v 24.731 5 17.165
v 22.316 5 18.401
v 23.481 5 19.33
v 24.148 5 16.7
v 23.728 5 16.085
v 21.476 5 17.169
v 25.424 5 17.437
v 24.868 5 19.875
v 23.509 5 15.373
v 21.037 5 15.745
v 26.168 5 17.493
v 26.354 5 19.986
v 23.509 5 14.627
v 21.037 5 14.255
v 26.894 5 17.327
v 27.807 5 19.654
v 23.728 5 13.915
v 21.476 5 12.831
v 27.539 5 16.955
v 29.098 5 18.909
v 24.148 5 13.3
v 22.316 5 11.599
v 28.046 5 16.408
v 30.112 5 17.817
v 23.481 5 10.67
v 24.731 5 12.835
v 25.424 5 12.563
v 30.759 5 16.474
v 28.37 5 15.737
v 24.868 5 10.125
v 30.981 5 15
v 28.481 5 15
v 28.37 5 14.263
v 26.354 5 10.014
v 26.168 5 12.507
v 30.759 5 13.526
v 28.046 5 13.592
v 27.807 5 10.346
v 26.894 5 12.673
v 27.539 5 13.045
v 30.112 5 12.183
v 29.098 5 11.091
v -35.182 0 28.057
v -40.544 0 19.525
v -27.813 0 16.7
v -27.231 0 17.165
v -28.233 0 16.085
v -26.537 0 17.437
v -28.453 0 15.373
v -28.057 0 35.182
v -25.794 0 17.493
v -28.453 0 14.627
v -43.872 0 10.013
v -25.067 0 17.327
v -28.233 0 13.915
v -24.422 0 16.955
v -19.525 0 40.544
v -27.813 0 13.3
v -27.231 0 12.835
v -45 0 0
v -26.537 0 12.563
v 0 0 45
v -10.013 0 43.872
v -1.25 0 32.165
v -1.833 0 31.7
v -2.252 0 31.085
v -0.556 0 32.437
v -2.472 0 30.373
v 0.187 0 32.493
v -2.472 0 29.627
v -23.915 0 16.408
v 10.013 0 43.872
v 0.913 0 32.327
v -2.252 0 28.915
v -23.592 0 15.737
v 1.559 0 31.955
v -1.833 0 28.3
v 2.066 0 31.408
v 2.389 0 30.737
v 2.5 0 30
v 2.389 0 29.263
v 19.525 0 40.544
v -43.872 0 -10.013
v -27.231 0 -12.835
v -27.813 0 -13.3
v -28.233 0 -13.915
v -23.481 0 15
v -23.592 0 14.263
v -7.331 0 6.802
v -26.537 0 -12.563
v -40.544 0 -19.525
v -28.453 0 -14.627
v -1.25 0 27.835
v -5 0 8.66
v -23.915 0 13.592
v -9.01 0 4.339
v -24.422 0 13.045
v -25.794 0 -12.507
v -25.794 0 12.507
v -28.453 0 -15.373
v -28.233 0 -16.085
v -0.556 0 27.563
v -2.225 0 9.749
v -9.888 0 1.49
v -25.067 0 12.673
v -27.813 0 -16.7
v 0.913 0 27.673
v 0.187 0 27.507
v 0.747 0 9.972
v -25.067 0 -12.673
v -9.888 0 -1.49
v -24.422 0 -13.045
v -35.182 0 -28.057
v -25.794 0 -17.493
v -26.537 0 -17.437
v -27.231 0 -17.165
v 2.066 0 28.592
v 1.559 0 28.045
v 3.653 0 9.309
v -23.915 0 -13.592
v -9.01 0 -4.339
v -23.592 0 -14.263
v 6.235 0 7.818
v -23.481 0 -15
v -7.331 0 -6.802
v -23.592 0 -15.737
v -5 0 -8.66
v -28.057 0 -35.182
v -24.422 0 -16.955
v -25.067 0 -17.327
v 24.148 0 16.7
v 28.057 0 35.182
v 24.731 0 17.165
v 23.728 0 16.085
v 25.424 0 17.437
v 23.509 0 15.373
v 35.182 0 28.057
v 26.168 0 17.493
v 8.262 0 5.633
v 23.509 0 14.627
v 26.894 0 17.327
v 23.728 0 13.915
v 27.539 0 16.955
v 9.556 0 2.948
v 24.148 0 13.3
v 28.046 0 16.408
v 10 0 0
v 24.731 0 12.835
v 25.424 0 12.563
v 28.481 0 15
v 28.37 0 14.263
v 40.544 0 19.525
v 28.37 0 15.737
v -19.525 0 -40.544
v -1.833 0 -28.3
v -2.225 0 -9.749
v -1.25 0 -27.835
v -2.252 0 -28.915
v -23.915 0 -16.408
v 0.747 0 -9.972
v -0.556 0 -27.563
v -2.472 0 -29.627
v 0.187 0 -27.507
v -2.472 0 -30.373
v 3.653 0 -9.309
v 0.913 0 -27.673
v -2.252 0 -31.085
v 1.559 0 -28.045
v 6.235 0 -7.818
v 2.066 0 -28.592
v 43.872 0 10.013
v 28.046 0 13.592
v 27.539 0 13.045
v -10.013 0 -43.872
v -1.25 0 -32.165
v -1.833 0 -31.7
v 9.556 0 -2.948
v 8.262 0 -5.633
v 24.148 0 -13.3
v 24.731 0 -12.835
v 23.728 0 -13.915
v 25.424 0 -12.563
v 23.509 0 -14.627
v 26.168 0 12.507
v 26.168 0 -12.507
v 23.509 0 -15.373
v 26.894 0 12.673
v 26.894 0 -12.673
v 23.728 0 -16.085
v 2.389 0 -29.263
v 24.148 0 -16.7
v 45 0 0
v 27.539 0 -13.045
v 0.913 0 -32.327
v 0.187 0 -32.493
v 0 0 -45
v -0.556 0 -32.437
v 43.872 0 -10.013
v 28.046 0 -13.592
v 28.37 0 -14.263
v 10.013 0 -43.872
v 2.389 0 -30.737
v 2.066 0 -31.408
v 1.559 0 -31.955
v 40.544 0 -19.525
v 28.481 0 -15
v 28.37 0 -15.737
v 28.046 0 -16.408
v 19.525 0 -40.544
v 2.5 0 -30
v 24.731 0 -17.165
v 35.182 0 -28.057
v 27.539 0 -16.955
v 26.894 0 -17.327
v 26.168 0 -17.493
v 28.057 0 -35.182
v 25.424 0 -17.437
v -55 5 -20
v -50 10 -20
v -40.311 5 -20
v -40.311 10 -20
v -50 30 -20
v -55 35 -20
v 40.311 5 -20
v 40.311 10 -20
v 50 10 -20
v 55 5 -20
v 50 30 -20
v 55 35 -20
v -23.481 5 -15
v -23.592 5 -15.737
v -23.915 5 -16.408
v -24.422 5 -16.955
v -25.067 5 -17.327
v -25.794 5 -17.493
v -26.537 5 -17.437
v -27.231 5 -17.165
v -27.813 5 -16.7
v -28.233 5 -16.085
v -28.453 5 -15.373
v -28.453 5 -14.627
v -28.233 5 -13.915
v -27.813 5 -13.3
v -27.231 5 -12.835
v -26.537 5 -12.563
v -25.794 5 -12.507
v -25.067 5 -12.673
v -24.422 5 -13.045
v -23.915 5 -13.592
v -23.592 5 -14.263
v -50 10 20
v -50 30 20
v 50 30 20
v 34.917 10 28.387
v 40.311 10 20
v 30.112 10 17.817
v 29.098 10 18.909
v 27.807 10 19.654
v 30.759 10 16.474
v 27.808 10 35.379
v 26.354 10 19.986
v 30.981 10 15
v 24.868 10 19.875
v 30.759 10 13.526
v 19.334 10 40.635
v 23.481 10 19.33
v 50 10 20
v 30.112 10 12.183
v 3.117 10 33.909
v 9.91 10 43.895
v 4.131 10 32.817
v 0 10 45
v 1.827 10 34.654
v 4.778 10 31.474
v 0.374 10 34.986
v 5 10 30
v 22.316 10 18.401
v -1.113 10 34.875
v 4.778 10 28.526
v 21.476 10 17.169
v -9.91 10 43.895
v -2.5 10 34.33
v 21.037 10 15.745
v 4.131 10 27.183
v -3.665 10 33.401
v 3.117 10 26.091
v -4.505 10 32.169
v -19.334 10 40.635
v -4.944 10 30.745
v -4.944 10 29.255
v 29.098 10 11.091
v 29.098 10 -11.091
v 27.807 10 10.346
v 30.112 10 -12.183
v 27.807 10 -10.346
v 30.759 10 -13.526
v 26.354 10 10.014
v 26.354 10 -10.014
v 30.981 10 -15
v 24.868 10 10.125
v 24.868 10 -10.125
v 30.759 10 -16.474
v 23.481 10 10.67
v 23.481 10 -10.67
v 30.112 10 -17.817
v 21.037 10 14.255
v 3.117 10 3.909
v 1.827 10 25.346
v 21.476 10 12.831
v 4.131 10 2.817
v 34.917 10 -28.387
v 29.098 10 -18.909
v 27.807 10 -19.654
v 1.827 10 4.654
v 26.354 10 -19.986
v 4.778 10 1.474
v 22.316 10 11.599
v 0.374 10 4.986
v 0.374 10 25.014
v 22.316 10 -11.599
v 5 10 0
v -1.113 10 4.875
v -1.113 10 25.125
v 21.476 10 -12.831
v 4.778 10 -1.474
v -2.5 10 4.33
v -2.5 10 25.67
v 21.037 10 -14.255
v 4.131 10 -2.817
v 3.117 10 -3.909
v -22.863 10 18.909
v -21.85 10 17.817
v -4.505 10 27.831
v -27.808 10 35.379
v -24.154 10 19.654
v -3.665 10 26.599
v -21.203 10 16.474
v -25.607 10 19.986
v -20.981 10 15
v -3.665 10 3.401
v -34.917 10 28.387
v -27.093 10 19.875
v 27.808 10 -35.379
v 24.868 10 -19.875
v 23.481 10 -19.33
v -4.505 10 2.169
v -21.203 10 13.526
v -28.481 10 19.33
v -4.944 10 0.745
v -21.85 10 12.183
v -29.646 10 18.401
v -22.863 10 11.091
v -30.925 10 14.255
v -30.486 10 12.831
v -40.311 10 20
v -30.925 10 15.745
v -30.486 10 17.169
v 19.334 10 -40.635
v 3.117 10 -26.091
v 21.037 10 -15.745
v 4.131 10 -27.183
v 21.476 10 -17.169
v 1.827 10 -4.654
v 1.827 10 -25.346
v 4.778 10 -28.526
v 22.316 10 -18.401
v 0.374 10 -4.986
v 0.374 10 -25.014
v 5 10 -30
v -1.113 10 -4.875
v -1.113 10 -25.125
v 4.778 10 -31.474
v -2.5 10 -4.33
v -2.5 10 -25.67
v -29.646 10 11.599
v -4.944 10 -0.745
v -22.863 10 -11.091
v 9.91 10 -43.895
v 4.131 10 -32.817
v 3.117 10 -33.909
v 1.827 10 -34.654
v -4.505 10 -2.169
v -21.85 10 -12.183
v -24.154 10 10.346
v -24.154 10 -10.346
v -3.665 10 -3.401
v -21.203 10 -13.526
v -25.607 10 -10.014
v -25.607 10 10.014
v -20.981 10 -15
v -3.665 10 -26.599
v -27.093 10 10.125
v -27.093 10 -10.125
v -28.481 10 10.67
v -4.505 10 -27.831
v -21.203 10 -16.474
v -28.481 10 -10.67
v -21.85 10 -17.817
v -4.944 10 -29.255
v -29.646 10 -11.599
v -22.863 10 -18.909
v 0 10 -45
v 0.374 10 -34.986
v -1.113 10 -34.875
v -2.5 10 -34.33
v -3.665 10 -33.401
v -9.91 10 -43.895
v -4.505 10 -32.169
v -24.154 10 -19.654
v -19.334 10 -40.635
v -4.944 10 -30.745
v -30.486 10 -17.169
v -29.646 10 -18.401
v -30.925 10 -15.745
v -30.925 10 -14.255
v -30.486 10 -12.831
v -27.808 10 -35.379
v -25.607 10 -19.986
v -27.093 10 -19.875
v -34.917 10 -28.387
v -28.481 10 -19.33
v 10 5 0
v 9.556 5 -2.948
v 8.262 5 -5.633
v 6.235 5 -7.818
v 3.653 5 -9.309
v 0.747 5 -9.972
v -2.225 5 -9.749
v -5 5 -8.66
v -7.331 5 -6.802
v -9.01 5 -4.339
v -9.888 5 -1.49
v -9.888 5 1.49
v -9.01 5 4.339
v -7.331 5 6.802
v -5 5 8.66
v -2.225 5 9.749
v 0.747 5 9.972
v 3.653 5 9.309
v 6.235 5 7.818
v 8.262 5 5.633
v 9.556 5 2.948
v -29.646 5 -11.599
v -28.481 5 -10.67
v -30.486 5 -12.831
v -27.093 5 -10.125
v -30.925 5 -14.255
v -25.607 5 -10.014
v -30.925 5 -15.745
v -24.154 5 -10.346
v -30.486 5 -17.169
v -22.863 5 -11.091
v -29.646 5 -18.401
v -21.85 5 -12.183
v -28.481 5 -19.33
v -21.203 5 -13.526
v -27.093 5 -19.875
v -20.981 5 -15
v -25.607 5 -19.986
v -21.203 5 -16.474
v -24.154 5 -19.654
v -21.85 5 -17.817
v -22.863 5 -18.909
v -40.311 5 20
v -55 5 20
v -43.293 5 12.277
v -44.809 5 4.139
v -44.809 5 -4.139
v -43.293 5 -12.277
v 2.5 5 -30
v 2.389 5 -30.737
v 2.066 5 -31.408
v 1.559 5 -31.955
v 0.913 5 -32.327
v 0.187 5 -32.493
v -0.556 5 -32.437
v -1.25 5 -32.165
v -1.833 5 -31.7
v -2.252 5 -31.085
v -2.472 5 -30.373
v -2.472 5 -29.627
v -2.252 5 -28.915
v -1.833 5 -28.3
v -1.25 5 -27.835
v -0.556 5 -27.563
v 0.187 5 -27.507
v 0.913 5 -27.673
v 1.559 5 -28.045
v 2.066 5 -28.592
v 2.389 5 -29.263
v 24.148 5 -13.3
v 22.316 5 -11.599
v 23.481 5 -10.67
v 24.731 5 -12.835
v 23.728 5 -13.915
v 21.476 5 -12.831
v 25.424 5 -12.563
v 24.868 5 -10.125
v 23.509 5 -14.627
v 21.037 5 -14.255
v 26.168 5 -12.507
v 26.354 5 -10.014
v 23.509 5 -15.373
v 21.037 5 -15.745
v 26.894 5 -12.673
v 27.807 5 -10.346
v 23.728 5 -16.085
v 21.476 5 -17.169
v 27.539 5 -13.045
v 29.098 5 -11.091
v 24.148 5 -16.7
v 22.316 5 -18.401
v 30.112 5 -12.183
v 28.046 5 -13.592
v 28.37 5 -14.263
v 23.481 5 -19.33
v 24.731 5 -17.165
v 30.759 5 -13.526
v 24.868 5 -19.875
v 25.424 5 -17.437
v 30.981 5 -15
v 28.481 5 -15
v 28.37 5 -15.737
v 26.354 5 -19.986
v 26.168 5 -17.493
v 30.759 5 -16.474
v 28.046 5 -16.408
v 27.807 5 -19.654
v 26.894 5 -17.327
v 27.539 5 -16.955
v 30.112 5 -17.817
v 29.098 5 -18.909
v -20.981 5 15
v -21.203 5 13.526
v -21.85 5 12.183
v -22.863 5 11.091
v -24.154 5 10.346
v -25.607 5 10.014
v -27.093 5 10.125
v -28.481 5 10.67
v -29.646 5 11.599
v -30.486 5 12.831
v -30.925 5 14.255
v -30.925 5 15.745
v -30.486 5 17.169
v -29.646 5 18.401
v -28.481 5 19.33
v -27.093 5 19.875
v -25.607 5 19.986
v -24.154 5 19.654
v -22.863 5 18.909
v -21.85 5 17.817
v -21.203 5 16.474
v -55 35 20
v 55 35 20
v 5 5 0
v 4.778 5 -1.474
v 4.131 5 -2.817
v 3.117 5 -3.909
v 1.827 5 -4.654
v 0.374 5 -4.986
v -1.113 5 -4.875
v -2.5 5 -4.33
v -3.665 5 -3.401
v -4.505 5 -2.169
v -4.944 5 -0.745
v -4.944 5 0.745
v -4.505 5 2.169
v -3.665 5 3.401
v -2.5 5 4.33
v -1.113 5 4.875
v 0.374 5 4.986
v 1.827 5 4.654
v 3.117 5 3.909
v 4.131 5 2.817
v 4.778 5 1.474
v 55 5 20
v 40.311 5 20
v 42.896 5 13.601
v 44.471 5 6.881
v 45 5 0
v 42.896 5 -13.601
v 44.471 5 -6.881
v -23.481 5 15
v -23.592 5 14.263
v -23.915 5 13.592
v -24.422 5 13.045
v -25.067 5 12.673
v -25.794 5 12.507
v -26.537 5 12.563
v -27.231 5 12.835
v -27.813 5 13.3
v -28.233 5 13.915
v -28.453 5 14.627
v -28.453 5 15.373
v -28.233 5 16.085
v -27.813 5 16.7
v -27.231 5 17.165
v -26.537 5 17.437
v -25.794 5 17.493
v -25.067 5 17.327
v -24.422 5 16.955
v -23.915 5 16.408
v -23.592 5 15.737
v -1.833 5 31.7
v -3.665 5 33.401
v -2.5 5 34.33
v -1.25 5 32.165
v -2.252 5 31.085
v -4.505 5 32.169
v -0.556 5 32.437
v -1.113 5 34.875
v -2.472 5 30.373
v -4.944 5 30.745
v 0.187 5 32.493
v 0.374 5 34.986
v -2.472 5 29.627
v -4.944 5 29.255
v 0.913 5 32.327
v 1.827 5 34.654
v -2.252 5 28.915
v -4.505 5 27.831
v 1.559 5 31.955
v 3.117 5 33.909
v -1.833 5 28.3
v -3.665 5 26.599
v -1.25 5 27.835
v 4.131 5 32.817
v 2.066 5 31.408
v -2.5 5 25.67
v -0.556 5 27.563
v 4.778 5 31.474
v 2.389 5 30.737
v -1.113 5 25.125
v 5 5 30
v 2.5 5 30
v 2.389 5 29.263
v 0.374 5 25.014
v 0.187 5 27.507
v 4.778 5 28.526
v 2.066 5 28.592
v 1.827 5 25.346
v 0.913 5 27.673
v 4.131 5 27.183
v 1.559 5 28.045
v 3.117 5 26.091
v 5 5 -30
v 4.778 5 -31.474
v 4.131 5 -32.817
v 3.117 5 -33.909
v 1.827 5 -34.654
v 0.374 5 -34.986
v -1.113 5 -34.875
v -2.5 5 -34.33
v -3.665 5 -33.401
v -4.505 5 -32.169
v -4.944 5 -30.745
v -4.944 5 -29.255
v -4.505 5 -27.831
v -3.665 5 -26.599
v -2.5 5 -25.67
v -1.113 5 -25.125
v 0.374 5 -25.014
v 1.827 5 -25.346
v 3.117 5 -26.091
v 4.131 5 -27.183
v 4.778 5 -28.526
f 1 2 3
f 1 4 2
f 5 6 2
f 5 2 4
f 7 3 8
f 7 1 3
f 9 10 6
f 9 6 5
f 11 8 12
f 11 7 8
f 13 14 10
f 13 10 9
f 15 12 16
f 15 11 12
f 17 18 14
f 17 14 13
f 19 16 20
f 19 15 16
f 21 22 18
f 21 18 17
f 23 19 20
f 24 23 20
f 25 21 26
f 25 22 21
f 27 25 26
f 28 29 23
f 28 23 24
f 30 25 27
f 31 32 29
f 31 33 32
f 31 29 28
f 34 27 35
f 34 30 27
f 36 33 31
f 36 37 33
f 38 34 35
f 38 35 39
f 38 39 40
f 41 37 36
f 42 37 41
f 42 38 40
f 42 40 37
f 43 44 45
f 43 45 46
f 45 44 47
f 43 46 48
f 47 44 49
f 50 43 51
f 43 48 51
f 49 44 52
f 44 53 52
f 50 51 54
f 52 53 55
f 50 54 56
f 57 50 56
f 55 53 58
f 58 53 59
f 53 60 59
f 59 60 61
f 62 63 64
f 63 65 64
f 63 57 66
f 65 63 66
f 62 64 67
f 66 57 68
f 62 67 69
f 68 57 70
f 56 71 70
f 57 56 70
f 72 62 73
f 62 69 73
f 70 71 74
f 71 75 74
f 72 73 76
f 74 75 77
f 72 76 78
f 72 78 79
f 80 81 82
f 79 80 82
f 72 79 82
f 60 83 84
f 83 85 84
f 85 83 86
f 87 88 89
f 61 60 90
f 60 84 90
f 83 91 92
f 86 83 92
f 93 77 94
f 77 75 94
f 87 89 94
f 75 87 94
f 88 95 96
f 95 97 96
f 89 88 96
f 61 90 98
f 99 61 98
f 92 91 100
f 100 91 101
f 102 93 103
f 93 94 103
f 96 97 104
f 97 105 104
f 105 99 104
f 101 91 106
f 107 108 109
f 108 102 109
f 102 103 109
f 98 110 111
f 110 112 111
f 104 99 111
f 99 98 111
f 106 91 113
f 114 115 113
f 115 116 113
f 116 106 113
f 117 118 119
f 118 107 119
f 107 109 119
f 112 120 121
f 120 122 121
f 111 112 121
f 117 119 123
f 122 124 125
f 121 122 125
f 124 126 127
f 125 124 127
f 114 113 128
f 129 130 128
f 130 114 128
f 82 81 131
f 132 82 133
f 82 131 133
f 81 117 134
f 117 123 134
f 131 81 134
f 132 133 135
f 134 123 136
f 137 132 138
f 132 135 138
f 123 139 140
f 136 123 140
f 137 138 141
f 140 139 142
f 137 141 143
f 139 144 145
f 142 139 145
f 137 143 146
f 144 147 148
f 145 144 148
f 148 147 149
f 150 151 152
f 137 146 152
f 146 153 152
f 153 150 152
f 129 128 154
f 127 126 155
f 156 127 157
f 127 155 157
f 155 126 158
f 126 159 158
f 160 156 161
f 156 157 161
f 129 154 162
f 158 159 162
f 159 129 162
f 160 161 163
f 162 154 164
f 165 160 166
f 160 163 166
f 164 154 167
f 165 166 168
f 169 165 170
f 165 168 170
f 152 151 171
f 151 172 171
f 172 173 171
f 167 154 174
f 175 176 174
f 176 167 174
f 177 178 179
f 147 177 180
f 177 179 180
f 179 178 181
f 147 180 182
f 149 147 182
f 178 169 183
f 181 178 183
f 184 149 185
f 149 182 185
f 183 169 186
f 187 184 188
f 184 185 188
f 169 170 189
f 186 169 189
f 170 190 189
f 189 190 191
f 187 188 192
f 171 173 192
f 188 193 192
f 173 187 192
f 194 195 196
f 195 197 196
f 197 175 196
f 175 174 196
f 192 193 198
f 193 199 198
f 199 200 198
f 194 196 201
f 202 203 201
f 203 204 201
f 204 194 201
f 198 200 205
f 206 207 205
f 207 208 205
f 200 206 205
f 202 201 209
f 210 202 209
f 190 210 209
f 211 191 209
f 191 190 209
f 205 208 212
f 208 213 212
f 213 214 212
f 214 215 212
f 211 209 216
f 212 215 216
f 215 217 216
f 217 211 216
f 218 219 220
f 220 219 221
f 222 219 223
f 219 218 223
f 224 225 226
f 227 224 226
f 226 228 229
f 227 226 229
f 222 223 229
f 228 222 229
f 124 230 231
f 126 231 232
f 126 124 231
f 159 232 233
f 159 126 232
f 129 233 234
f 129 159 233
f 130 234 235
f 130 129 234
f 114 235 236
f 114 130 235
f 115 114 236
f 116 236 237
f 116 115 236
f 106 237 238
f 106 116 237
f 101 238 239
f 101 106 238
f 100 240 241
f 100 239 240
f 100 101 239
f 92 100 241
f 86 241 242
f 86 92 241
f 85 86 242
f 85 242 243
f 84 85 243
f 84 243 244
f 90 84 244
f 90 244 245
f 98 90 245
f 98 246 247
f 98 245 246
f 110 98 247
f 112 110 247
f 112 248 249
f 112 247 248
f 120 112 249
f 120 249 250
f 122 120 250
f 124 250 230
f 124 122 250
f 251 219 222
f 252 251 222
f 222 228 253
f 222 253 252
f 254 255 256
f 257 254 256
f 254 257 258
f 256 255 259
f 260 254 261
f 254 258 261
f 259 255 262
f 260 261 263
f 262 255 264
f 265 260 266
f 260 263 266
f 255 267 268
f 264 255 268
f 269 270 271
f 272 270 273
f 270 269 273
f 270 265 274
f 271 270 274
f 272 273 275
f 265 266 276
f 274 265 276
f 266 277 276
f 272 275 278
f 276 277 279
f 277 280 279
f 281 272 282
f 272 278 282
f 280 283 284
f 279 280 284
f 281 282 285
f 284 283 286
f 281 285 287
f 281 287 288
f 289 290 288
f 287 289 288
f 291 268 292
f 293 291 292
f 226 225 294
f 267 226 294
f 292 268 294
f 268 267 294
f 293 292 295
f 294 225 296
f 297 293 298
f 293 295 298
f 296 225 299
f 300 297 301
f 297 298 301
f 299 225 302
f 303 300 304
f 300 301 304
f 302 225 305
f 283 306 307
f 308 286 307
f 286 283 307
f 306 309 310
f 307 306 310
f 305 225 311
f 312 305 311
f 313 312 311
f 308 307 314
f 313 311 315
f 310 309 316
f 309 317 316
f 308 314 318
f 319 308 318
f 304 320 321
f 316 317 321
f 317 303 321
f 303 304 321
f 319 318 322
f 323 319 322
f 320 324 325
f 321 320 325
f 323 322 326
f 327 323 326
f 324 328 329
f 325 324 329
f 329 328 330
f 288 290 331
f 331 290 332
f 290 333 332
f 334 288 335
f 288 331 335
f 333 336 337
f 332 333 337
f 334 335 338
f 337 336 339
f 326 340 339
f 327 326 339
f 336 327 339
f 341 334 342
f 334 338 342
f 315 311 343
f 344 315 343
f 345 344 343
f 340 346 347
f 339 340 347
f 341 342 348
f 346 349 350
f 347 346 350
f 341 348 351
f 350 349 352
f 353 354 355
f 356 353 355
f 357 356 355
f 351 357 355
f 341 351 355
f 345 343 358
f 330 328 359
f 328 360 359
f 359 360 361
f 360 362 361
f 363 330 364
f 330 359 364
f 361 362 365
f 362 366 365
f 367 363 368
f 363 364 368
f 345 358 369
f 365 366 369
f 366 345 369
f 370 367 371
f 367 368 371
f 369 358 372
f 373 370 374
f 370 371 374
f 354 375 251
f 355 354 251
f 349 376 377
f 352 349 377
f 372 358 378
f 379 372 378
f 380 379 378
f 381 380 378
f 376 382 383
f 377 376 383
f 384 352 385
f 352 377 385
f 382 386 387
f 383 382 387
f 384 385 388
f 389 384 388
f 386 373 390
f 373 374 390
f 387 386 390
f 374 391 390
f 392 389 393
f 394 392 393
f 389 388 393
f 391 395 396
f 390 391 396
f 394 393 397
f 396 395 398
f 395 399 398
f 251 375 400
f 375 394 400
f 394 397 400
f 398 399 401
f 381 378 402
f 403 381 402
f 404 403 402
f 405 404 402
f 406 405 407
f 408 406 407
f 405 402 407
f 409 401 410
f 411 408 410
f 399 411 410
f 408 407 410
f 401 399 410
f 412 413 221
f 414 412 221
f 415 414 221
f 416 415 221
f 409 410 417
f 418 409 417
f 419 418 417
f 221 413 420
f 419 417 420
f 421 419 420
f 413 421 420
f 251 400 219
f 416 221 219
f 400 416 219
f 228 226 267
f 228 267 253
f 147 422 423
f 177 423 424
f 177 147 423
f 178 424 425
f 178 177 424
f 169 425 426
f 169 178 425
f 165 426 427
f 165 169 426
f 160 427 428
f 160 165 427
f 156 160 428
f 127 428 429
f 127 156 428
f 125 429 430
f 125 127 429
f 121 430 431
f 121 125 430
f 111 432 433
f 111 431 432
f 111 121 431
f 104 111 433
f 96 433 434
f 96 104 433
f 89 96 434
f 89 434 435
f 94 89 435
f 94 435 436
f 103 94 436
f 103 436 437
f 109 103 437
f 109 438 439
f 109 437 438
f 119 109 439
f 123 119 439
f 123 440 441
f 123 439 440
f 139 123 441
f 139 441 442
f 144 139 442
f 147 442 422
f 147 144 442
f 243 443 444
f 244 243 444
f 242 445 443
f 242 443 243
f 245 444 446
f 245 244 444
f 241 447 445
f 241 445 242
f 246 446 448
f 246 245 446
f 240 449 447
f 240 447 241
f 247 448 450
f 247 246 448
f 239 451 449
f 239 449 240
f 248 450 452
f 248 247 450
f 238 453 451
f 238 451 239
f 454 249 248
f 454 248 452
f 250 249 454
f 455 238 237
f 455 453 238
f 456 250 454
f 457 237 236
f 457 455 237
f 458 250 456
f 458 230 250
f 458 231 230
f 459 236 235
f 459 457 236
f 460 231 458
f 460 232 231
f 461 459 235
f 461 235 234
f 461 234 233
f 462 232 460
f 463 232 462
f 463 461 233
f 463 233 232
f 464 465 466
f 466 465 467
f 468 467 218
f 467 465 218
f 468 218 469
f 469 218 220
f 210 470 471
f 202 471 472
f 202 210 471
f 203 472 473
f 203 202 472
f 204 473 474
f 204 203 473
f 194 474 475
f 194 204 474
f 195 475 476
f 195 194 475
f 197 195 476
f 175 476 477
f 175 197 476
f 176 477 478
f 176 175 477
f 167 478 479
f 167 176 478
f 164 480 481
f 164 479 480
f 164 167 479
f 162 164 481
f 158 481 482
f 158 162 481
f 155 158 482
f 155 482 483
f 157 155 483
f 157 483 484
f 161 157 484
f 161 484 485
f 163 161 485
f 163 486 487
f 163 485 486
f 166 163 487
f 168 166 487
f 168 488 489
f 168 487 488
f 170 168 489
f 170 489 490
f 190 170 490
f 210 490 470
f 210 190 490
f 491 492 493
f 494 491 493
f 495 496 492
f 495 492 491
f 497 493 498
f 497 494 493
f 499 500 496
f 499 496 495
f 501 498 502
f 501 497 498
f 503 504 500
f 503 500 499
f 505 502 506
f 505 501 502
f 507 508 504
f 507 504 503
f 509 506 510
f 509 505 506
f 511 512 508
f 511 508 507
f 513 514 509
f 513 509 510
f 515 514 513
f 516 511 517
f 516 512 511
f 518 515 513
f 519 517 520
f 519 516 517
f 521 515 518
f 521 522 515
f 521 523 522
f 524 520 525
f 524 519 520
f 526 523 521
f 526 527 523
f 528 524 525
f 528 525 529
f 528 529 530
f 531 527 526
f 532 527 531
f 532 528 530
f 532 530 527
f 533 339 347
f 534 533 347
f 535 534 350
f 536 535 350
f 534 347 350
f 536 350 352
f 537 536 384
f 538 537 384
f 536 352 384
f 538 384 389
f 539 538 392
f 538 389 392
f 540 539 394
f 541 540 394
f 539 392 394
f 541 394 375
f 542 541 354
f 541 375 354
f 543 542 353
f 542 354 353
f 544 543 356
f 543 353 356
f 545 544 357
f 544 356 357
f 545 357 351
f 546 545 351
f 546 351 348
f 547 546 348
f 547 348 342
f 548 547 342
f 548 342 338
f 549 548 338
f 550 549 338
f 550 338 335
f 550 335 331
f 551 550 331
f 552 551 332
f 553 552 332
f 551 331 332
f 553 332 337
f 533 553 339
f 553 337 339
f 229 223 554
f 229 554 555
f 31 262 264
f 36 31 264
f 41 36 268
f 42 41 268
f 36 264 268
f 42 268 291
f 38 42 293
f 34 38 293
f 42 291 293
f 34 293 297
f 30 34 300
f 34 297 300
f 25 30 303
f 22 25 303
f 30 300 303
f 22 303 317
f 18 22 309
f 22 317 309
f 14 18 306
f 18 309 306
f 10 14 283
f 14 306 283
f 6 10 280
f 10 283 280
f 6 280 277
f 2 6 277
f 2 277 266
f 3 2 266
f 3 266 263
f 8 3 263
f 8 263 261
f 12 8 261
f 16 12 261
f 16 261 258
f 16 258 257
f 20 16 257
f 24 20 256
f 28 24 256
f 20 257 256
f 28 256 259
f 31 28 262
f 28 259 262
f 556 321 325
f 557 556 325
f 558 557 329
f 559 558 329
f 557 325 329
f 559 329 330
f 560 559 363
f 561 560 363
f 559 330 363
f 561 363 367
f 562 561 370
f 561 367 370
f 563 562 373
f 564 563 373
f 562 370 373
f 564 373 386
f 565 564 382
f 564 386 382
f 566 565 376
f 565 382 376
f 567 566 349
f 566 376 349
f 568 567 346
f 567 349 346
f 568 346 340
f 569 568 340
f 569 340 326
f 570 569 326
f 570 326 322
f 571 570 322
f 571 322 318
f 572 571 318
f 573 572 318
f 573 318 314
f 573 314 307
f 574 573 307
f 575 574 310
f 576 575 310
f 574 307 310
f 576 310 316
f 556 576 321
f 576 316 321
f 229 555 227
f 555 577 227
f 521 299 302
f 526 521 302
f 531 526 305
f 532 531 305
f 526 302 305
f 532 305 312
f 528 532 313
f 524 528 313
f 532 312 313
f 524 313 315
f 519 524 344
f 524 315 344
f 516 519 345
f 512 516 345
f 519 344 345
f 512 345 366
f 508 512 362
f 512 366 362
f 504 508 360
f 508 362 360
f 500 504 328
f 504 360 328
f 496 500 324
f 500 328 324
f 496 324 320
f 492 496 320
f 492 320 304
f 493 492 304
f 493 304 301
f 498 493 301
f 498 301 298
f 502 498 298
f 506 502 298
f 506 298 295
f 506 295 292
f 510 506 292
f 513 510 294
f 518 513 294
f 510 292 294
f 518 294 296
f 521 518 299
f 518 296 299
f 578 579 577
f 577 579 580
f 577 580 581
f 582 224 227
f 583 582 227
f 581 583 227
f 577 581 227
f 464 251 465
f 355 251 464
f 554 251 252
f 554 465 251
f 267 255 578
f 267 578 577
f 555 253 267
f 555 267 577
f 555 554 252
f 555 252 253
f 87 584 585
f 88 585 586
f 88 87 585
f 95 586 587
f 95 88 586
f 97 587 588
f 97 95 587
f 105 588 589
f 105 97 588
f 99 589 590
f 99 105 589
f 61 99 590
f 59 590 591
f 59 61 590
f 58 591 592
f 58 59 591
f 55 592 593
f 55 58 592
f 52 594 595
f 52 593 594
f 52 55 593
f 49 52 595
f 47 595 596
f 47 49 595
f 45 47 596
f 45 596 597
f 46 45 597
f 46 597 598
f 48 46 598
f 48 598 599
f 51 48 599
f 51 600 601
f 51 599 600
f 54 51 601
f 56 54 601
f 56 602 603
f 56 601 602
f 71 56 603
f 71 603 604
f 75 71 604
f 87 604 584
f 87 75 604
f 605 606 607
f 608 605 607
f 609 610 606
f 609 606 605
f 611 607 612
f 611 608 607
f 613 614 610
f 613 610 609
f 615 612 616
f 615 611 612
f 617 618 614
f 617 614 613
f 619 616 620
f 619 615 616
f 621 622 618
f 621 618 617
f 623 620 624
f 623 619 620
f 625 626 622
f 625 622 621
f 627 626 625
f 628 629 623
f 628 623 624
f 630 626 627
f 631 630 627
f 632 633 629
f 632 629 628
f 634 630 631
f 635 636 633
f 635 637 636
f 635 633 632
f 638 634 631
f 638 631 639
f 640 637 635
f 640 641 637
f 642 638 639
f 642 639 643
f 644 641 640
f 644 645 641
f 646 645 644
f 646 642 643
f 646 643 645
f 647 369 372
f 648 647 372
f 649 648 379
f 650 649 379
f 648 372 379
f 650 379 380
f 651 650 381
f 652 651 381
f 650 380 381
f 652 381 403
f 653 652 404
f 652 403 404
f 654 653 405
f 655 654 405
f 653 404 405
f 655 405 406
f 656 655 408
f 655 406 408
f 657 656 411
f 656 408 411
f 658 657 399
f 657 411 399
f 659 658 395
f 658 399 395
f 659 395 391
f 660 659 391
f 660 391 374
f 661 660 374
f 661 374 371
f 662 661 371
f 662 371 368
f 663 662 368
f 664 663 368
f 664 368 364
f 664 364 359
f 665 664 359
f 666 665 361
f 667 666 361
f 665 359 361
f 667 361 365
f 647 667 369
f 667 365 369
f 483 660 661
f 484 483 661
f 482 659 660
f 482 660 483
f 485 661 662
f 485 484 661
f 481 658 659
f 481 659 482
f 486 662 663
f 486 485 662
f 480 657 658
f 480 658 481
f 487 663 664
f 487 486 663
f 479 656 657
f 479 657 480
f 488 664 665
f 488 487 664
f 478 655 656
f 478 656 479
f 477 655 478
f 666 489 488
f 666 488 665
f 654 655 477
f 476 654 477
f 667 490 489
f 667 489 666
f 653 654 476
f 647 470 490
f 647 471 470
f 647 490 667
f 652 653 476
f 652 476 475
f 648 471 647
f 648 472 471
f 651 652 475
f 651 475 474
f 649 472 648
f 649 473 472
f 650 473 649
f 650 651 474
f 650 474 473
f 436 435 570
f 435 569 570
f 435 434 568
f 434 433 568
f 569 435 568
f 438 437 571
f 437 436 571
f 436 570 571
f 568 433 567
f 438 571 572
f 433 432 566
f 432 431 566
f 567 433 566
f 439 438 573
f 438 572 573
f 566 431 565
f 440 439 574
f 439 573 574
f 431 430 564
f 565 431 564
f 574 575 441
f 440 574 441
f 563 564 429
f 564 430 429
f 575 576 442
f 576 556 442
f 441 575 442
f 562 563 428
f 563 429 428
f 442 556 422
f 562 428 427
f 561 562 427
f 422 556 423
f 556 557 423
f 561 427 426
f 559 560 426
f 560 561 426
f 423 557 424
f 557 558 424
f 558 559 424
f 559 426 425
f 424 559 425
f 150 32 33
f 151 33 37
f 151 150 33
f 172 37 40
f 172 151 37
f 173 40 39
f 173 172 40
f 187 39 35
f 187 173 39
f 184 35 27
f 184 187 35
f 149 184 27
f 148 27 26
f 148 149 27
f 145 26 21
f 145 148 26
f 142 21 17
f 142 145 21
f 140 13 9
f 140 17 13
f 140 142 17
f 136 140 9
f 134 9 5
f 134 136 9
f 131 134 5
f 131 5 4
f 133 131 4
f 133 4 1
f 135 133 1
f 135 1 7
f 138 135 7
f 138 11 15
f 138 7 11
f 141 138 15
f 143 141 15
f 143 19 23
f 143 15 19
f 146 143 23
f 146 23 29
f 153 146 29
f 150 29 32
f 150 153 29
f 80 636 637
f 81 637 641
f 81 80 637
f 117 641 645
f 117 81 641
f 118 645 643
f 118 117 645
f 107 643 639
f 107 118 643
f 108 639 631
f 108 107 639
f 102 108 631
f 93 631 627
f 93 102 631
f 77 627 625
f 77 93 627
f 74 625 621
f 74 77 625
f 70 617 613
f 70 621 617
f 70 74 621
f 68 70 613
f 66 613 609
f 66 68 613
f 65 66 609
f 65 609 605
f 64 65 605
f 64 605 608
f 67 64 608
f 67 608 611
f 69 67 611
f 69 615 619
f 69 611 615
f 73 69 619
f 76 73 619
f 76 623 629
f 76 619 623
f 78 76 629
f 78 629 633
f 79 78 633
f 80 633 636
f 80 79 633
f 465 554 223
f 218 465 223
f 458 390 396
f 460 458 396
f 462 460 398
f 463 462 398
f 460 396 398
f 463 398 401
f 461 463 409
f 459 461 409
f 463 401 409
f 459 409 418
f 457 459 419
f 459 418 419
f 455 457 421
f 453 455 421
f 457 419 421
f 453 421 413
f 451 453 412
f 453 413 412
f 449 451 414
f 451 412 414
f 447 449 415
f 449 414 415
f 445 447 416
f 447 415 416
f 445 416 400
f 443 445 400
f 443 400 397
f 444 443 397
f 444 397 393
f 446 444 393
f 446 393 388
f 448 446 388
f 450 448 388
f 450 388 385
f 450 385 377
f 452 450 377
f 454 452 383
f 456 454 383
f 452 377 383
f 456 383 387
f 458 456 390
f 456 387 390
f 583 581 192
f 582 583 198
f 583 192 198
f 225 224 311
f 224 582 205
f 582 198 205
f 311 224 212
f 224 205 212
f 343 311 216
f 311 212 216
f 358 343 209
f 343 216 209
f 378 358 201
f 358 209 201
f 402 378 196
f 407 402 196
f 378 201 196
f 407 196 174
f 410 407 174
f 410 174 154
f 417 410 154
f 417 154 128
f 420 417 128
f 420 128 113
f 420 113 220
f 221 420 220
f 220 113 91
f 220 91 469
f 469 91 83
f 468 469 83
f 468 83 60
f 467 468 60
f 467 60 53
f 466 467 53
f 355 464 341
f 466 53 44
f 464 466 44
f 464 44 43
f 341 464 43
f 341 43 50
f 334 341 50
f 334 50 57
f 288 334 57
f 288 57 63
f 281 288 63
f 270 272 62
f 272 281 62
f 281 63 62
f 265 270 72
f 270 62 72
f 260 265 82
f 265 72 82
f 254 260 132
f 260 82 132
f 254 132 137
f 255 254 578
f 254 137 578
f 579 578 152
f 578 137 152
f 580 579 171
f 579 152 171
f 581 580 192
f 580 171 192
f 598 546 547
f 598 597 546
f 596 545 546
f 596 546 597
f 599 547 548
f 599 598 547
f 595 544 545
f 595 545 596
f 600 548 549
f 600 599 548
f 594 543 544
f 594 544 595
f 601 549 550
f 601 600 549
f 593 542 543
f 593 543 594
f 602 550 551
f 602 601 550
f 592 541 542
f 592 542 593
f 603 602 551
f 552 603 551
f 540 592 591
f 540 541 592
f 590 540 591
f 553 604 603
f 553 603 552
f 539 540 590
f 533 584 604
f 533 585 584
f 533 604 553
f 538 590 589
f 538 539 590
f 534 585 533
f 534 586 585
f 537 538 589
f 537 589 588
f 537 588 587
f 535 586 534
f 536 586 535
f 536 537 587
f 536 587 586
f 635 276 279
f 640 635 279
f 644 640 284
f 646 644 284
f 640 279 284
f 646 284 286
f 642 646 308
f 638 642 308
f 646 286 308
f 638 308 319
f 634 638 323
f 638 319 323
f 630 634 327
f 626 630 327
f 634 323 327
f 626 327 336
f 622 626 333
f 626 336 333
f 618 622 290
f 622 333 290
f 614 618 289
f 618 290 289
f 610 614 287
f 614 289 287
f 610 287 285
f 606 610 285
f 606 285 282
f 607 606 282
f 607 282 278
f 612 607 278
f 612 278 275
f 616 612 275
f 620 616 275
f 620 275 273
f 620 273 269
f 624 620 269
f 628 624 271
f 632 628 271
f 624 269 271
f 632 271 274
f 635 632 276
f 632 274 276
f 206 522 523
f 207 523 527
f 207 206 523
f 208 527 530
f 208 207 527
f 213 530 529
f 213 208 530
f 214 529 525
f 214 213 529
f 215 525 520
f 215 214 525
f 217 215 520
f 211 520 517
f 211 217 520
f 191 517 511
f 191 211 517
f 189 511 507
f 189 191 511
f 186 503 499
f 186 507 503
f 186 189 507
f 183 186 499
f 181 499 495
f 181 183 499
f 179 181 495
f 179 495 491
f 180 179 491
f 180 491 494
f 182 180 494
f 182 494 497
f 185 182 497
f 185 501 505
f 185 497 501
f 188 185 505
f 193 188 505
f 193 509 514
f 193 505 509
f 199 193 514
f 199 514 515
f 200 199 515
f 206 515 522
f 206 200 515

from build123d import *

# Parameters (mm, degrees)
SKETCH1_R                = 45
SKETCH1_R_2              = 2.5
SKETCH1_R_3              = 10
BOSS_EXTRUDE1_DEPTH      = 10
SKETCH2_W                = 110
SKETCH2_H                = 40
BOSS_EXTRUDE2_DEPTH      = 25
BOSS_EXTRUDE2_DEPTH_BACK = 5
SKETCH3_W                = 100
SKETCH3_H                = 20
CUT_EXTRUDE1_DEPTH       = 45
SKETCH4_R                = 5
CUT_EXTRUDE2_DEPTH       = 5


with BuildPart() as part:
    # Sketch1 → Boss-Extrude1 (new body)
    with BuildSketch(Plane(origin=(0, 0, 0), x_dir=(1, 0, 0), z_dir=(0, 1, 0))):
        Circle(SKETCH1_R)
        with Locations((0, 30)):
            Circle(SKETCH1_R_2, mode=Mode.SUBTRACT)
        with Locations((25.980762114, 15)):
            Circle(SKETCH1_R_2, mode=Mode.SUBTRACT)
        with Locations((25.980762114, -15)):
            Circle(SKETCH1_R_2, mode=Mode.SUBTRACT)
        with Locations((0, -30)):
            Circle(SKETCH1_R_2, mode=Mode.SUBTRACT)
        with Locations((-25.980762114, -15)):
            Circle(SKETCH1_R_2, mode=Mode.SUBTRACT)
        with Locations((-25.980762114, 15)):
            Circle(SKETCH1_R_2, mode=Mode.SUBTRACT)
        Circle(SKETCH1_R_3, mode=Mode.SUBTRACT)
    extrude(amount=BOSS_EXTRUDE1_DEPTH)

    # Sketch2 → Boss-Extrude2 (add, two sides)
    with BuildSketch(Plane(origin=(0, 10, 0), x_dir=(1, 0, 0), z_dir=(0, 1, 0))) as boss_extrude2_sk:
        Rectangle(SKETCH2_W, SKETCH2_H)
    extrude(amount=BOSS_EXTRUDE2_DEPTH)
    extrude(boss_extrude2_sk.sketch, amount=-BOSS_EXTRUDE2_DEPTH_BACK)

    # Sketch3 → Cut-Extrude1 (cut)
    with BuildSketch(Plane(origin=(0, 0, -20), x_dir=(-1, 0, 0), z_dir=(0, 0, -1))):
        with Locations((0, 20)):
            Rectangle(SKETCH3_W, SKETCH3_H)
    extrude(amount=-CUT_EXTRUDE1_DEPTH, mode=Mode.SUBTRACT)

    # Sketch4 → Cut-Extrude2 (cut)
    with BuildSketch(Plane(origin=(0, 10, 0), x_dir=(1, 0, 0), z_dir=(0, 1, 0))):
        with Locations((0, 30)):
            Circle(SKETCH4_R)
        with Locations((25.980762114, 15)):
            Circle(SKETCH4_R)
        with Locations((25.980762114, -15)):
            Circle(SKETCH4_R)
        with Locations((0, -30)):
            Circle(SKETCH4_R)
        with Locations((-25.980762114, -15)):
            Circle(SKETCH4_R)
        with Locations((-25.980762114, 15)):
            Circle(SKETCH4_R)
        Circle(SKETCH4_R)
    extrude(amount=-CUT_EXTRUDE2_DEPTH, mode=Mode.SUBTRACT)


solid = part.part
